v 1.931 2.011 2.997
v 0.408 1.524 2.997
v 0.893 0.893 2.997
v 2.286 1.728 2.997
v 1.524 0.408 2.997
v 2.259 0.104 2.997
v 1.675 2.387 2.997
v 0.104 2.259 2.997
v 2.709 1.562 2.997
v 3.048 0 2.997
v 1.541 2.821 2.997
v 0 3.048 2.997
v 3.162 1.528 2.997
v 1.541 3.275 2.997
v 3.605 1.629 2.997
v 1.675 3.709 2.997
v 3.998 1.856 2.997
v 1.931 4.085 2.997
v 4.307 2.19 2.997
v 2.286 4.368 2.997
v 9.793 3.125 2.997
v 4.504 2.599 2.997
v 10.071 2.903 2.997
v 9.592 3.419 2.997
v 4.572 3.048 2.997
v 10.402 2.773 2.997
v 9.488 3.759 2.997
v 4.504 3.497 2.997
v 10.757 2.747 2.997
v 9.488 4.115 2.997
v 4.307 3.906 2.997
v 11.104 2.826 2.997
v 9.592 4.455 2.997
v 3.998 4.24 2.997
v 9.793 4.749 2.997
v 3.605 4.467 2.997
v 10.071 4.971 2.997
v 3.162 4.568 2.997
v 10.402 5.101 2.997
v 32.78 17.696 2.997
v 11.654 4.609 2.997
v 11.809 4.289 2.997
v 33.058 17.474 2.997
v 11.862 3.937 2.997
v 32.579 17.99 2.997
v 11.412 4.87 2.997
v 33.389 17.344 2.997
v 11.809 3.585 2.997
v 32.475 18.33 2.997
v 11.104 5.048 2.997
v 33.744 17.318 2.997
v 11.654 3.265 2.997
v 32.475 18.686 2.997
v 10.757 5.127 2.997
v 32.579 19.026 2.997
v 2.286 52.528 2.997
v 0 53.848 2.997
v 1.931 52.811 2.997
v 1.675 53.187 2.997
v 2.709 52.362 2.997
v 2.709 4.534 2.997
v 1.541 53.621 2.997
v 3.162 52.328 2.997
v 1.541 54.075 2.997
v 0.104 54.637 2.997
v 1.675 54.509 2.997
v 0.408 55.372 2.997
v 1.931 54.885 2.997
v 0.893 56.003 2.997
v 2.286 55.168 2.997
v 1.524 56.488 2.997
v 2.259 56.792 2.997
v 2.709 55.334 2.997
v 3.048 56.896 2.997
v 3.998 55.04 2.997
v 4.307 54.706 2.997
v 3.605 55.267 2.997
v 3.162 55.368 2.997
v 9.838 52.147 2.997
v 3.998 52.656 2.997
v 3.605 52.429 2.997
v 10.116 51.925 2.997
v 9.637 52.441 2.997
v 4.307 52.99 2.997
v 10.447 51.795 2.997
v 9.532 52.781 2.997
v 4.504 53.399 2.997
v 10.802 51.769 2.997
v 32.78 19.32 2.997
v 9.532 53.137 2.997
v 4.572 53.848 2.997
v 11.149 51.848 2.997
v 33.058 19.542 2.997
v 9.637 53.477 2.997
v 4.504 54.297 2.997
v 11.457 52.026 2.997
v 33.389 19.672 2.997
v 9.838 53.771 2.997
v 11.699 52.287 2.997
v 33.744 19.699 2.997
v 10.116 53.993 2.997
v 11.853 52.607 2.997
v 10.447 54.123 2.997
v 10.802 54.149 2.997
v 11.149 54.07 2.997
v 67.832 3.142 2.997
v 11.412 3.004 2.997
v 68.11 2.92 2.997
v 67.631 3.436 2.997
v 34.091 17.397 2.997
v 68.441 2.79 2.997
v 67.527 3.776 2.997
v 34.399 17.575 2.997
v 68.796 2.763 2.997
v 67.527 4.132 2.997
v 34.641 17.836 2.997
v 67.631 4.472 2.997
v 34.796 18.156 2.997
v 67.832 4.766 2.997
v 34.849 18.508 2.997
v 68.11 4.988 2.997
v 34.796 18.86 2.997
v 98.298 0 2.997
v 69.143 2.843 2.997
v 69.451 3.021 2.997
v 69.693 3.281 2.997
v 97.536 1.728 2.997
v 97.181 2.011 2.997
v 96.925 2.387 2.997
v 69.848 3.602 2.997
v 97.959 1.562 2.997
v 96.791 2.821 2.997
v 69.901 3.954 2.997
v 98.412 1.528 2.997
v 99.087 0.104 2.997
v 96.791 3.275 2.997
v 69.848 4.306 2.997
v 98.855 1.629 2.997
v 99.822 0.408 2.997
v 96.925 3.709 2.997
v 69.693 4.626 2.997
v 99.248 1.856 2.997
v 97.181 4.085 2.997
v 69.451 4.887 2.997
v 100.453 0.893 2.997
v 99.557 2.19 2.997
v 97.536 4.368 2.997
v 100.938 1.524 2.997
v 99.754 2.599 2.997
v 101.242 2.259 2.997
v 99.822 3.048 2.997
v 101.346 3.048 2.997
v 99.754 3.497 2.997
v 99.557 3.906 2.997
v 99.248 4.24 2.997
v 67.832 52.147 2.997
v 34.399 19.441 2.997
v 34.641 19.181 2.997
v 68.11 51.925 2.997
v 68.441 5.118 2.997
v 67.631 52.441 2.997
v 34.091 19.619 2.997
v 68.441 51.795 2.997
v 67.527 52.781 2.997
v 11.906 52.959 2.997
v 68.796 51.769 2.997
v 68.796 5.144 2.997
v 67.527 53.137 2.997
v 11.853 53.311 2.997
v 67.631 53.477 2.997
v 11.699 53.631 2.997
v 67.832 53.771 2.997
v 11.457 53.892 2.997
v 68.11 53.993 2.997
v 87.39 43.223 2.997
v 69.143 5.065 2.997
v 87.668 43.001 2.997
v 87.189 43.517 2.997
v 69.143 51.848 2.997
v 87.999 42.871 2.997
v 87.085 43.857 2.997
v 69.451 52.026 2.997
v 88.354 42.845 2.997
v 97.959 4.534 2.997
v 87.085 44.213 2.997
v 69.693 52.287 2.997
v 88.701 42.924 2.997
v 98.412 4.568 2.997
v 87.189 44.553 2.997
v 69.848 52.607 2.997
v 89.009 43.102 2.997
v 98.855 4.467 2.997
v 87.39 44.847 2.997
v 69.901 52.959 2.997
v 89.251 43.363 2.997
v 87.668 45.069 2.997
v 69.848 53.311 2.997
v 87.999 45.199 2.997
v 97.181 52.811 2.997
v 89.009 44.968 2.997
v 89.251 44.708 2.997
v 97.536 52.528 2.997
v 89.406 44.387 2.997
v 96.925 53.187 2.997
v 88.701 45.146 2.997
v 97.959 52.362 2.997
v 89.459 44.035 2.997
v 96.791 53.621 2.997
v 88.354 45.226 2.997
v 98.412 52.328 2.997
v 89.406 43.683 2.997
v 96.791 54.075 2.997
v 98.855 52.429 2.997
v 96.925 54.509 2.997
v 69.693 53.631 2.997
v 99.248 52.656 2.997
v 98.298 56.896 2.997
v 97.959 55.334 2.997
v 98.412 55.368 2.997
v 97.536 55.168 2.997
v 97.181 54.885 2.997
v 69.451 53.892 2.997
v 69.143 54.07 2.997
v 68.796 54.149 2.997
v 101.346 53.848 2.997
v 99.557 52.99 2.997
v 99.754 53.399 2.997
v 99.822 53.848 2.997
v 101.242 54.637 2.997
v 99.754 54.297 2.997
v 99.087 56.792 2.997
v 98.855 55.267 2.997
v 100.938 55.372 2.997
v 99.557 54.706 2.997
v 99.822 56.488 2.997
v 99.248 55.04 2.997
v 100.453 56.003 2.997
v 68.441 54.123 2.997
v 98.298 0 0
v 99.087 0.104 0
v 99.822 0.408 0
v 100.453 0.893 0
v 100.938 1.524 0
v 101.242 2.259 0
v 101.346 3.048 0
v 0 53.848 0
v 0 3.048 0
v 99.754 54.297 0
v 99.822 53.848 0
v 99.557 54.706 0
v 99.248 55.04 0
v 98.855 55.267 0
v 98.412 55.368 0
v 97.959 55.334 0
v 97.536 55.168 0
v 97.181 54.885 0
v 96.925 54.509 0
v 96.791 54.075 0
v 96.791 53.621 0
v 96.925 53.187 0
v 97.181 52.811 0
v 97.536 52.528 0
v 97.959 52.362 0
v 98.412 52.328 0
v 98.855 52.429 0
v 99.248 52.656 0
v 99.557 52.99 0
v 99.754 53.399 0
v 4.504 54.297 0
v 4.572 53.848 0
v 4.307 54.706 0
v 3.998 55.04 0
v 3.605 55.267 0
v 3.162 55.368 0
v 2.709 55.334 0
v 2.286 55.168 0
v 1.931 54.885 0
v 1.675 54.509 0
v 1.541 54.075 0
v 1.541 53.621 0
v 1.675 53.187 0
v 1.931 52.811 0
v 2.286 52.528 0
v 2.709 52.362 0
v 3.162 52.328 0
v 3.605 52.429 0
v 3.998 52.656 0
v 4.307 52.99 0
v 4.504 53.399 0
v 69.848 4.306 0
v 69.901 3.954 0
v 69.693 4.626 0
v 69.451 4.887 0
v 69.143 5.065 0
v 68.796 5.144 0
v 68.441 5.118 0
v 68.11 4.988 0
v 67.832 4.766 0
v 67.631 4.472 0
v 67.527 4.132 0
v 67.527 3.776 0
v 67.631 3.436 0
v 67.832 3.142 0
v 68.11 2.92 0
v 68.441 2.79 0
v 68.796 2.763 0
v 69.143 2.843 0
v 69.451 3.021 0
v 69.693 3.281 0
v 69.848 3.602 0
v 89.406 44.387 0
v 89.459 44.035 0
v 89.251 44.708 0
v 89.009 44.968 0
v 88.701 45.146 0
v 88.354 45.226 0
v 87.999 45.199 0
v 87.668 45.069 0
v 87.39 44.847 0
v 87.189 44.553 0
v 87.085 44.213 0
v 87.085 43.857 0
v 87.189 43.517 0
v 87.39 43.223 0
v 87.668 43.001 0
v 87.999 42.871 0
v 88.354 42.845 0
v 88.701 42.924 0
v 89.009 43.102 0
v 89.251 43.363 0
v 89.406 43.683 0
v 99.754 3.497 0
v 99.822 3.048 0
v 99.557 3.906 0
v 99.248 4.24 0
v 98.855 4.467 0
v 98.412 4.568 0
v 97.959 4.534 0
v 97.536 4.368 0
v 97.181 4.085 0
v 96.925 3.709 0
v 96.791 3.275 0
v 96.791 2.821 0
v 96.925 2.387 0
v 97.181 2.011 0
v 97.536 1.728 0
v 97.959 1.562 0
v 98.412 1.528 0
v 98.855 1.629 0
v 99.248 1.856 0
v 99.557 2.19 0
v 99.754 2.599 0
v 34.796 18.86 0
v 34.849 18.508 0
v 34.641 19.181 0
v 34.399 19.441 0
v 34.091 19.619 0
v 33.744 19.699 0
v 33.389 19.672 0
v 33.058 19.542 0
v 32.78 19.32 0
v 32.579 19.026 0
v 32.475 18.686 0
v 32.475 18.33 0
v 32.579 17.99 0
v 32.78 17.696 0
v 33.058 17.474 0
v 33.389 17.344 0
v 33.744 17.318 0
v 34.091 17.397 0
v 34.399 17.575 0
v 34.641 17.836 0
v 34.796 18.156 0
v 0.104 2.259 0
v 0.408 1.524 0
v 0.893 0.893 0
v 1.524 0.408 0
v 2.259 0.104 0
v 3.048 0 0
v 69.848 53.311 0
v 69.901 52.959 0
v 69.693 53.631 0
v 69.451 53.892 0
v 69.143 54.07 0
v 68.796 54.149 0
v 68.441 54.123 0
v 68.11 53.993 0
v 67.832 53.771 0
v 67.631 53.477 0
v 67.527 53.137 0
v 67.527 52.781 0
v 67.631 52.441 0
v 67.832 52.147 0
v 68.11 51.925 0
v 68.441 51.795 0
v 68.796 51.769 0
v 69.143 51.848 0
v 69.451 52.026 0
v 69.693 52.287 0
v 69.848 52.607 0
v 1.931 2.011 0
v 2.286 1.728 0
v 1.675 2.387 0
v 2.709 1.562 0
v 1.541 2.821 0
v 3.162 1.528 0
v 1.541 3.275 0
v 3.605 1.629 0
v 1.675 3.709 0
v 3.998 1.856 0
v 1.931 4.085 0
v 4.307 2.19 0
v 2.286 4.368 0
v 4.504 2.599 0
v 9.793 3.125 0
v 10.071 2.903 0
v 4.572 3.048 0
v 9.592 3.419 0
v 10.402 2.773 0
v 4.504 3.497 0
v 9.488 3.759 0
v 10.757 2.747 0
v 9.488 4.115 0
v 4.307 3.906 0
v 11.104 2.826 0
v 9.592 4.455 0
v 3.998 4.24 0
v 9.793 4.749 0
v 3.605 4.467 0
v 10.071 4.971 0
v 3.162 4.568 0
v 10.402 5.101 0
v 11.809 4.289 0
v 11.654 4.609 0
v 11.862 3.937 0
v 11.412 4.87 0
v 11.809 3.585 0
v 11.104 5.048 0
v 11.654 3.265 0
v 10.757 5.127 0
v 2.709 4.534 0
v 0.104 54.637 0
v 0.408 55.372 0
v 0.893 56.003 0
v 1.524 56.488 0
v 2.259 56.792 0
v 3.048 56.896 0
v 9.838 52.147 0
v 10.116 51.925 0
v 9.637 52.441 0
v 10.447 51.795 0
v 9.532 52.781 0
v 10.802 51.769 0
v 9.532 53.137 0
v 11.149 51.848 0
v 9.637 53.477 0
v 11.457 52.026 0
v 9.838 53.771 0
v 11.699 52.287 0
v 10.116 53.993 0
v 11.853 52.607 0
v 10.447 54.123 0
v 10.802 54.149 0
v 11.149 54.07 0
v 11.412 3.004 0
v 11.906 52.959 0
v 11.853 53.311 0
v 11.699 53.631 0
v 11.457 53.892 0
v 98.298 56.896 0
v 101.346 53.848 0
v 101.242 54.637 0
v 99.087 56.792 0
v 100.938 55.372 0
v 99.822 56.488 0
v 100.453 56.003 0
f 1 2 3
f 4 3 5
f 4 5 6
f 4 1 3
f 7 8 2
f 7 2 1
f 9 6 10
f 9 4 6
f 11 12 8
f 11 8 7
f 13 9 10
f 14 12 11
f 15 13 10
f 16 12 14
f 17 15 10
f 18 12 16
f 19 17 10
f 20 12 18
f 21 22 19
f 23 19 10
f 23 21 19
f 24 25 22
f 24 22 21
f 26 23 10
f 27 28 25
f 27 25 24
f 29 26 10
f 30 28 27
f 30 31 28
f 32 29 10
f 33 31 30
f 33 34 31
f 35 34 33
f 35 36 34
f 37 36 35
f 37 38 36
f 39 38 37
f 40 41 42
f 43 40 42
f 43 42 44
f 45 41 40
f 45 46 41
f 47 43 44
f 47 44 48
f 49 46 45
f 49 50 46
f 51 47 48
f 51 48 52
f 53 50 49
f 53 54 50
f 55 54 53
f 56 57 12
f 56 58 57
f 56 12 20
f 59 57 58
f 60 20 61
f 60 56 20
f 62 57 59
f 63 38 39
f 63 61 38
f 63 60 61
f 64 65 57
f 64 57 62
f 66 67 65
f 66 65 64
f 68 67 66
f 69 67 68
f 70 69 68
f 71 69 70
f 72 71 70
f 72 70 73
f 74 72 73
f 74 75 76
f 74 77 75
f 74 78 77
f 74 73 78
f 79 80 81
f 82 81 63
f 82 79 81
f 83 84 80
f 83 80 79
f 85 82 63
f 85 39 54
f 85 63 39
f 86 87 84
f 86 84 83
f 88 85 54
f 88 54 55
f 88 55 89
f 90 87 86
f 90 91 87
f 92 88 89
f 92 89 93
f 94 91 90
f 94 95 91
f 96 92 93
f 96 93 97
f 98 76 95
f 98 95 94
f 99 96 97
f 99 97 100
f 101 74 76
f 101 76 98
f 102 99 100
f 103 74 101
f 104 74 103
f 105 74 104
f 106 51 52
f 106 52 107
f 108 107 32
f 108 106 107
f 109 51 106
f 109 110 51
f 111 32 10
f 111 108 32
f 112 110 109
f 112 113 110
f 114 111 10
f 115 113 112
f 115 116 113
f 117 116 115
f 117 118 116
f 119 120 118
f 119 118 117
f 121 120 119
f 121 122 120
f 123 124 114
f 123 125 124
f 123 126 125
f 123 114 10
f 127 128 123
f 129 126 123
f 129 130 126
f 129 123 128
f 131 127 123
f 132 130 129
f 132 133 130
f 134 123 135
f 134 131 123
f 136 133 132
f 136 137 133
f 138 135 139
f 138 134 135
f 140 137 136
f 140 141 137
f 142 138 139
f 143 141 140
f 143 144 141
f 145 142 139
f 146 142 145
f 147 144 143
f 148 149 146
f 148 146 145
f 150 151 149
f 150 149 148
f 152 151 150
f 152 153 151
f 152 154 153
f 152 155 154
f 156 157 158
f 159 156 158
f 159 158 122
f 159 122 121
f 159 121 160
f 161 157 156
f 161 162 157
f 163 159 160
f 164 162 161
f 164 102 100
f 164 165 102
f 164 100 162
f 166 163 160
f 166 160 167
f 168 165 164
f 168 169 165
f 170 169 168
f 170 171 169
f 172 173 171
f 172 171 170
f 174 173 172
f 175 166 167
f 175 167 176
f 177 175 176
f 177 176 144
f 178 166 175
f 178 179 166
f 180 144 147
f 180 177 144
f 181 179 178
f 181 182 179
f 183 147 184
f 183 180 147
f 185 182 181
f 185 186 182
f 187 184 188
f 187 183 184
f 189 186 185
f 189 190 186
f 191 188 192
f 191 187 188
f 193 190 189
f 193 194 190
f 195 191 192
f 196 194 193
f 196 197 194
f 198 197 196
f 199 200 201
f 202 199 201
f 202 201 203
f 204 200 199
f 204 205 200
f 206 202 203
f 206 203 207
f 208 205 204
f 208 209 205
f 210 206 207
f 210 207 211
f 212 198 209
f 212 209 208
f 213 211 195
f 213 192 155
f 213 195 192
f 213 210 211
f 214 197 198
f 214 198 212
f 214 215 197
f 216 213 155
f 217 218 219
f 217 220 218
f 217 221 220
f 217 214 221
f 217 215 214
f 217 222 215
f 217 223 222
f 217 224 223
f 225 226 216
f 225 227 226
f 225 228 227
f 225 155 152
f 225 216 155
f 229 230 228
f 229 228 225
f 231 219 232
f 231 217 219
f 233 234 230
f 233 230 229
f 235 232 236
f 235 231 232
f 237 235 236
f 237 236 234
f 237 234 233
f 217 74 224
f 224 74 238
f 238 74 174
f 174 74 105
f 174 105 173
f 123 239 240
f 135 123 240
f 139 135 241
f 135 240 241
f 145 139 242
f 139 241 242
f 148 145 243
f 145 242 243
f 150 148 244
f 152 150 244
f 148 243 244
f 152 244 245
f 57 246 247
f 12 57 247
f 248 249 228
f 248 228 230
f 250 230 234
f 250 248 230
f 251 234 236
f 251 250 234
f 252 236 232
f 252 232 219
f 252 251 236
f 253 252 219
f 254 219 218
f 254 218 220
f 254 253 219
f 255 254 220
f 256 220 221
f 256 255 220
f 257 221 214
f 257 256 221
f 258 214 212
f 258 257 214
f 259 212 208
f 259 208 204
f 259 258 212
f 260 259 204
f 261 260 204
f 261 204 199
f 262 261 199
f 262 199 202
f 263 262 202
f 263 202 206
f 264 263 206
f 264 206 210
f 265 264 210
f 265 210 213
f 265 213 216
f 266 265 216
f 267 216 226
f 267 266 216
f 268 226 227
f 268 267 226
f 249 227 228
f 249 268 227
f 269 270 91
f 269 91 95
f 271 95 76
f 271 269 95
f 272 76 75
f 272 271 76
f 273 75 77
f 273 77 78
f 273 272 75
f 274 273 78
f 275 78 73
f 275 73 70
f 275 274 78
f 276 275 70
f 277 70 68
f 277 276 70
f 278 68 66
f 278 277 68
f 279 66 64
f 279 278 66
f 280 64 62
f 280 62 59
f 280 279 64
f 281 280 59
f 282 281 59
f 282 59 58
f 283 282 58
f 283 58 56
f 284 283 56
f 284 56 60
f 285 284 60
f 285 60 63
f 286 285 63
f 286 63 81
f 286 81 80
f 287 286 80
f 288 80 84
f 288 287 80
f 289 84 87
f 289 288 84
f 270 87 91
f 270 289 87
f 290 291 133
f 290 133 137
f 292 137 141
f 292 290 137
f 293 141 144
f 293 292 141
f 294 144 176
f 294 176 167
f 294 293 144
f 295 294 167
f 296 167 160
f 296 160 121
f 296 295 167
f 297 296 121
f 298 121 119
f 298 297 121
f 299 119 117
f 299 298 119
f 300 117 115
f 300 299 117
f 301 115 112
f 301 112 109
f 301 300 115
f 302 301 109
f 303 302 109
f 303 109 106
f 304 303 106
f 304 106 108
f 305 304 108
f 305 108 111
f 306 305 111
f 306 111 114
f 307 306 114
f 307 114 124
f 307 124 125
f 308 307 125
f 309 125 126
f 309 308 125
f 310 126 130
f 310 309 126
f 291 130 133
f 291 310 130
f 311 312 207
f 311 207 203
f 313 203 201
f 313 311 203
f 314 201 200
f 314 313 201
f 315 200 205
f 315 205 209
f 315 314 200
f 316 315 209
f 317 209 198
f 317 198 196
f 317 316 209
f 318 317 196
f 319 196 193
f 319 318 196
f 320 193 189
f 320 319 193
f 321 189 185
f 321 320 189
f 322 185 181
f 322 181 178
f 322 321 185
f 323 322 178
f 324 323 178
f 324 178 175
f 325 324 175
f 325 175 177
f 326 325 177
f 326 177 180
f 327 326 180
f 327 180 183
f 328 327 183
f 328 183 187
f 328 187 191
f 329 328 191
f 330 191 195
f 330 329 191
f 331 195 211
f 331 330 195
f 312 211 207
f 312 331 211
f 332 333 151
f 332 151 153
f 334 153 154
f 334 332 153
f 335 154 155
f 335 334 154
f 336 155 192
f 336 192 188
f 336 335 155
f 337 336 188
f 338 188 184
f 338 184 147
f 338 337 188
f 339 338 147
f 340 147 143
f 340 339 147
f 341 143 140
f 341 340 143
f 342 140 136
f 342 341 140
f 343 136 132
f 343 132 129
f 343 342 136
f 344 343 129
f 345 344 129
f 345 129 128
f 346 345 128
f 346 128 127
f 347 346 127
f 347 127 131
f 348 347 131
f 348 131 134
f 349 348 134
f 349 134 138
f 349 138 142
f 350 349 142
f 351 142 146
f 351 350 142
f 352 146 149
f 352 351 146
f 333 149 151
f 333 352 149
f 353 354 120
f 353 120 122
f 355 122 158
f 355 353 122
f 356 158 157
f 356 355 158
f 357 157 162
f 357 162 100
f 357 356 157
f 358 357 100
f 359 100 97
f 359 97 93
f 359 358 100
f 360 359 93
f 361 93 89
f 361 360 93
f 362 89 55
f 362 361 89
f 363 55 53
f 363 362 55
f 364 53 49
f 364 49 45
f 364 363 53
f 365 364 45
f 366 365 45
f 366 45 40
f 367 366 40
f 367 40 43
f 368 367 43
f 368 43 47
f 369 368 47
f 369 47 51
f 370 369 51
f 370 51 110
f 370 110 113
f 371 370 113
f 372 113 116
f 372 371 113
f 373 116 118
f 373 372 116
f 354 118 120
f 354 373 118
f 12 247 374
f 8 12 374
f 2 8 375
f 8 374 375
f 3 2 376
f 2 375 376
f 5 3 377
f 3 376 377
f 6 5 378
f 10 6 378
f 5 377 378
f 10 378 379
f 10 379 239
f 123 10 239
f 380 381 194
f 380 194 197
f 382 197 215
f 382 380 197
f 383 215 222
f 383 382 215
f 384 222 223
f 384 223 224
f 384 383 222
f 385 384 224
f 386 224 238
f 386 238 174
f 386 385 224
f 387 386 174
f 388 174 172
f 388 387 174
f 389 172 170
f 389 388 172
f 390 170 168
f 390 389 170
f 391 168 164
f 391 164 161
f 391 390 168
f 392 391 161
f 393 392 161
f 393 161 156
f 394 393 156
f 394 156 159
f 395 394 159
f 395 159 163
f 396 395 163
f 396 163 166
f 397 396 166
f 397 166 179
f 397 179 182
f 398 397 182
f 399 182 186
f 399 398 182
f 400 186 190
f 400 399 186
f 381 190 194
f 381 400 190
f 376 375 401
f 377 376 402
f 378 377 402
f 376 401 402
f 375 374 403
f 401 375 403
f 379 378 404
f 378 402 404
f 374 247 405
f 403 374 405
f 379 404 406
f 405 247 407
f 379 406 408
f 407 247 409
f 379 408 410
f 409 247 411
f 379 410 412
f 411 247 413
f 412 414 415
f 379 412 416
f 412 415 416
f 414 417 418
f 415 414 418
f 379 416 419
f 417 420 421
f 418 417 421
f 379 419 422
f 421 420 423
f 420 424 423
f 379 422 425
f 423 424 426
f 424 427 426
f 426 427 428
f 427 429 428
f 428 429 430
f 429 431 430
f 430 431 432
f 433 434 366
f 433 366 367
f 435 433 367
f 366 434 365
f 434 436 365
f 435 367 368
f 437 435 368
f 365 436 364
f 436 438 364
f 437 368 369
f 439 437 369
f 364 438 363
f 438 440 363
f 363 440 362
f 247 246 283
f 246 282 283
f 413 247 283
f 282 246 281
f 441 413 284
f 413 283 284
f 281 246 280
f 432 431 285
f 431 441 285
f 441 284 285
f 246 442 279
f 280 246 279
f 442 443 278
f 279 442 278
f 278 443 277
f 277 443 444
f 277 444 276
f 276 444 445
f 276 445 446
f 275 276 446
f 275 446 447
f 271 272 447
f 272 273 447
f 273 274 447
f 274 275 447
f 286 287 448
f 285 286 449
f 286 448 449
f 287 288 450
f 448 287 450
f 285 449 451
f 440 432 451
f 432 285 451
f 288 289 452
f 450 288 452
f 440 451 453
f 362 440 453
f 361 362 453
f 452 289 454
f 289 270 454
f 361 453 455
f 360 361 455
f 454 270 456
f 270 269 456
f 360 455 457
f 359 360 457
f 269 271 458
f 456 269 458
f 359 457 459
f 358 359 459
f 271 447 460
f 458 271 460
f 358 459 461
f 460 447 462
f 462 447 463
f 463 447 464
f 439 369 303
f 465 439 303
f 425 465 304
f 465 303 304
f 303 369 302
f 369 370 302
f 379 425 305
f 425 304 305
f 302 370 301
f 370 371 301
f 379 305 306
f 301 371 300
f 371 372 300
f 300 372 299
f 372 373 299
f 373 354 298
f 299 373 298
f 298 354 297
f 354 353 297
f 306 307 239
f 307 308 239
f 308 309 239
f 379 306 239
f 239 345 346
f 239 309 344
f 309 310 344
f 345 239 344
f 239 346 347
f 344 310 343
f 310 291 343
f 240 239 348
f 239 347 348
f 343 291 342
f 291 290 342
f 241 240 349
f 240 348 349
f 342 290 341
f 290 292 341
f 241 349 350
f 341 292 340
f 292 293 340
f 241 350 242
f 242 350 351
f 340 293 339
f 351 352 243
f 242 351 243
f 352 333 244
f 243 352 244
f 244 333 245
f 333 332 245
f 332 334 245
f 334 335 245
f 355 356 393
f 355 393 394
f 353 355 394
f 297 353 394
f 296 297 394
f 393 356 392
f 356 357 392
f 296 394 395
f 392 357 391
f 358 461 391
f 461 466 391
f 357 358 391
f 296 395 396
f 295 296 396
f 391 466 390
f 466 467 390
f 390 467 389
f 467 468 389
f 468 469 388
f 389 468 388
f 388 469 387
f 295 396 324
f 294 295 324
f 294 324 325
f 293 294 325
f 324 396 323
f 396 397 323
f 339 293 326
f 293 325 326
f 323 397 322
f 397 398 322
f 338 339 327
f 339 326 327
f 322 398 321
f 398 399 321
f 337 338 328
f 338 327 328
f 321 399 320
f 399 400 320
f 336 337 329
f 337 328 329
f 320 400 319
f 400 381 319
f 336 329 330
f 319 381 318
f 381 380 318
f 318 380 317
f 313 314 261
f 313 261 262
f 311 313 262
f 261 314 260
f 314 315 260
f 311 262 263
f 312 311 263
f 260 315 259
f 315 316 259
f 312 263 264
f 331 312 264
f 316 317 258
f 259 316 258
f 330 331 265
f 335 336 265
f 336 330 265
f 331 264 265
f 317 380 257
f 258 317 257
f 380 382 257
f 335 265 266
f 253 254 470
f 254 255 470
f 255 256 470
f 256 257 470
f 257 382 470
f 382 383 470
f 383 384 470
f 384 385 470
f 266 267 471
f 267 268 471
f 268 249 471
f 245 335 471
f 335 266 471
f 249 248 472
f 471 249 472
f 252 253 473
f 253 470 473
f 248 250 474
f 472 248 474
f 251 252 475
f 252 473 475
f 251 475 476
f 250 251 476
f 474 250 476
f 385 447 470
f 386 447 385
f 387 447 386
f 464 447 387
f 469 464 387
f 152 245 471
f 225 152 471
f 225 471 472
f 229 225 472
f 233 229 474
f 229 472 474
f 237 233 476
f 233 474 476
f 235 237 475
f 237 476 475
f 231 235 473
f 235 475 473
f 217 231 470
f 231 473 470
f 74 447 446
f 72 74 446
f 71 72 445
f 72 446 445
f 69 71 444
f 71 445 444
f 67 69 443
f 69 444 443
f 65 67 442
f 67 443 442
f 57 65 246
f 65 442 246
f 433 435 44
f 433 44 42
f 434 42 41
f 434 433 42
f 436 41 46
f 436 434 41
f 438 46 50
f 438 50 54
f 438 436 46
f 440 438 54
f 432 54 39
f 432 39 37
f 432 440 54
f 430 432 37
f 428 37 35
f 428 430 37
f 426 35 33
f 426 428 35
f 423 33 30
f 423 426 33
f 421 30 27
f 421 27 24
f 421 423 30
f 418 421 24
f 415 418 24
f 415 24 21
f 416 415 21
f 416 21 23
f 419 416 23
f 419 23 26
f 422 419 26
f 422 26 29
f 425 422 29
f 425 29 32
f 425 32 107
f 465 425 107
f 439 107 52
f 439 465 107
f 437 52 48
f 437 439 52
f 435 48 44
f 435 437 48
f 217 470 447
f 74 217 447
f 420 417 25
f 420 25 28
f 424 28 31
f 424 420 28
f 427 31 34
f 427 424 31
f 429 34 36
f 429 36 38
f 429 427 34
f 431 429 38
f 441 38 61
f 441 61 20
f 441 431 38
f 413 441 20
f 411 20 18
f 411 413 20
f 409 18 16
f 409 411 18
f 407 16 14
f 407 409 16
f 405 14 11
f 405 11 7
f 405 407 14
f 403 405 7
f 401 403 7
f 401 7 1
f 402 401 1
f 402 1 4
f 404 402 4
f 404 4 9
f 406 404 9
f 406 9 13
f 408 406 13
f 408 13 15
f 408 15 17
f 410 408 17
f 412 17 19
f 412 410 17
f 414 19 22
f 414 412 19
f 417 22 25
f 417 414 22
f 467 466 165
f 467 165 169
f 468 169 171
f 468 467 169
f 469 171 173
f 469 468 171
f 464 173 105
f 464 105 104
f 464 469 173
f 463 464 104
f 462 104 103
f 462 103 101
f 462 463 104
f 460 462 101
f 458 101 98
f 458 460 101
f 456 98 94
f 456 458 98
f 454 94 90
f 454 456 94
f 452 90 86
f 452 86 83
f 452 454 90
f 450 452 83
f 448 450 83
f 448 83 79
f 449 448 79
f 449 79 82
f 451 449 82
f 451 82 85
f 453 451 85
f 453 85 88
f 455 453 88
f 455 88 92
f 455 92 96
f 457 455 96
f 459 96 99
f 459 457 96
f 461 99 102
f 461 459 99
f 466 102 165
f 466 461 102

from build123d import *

# Parameters (mm, degrees)
F0_R     = 1.524
F0_R_2   = 1.1938
F1_DEPTH = 2.9972


with BuildPart() as f1:
    # F0 (on Top) → F1 (new body)
    with BuildSketch(Plane.XY):
        with BuildLine():
            ThreePointArc((0, 3.048), (0.892739, 0.892739), (3.048, 0))
            Line((3.048, 0), (98.298, 0))
            ThreePointArc((98.298, 0), (100.453261, 0.892739), (101.346, 3.048))
            Line((101.346, 3.048), (101.346, 53.848))
            ThreePointArc((101.346, 53.848), (100.453261, 56.003261), (98.298, 56.896))
            Line((98.298, 56.896), (3.048, 56.896))
            ThreePointArc((3.048, 56.896), (0.892739, 56.003261), (0, 53.848))
            Line((0, 53.848), (0, 3.048))
        make_face()
        with Locations((3.048, 3.048)):
            Circle(F0_R, mode=Mode.SUBTRACT)
        with Locations((10.668, 3.937)):
            Circle(F0_R_2, mode=Mode.SUBTRACT)
        with Locations((33.655, 18.508092)):
            Circle(F0_R_2, mode=Mode.SUBTRACT)
        with Locations((68.707, 3.953922)):
            Circle(F0_R_2, mode=Mode.SUBTRACT)
        with Locations((98.298, 3.048)):
            Circle(F0_R, mode=Mode.SUBTRACT)
        with Locations((10.7127, 52.959)):
            Circle(F0_R_2, mode=Mode.SUBTRACT)
        with Locations((3.048, 53.848)):
            Circle(F0_R, mode=Mode.SUBTRACT)
        with Locations((68.707, 52.959)):
            Circle(F0_R_2, mode=Mode.SUBTRACT)
        with Locations((88.265, 44.035092)):
            Circle(F0_R_2, mode=Mode.SUBTRACT)
        with Locations((98.298, 53.848)):
            Circle(F0_R, mode=Mode.SUBTRACT)
    extrude(amount=F1_DEPTH)


solid = f1.part
